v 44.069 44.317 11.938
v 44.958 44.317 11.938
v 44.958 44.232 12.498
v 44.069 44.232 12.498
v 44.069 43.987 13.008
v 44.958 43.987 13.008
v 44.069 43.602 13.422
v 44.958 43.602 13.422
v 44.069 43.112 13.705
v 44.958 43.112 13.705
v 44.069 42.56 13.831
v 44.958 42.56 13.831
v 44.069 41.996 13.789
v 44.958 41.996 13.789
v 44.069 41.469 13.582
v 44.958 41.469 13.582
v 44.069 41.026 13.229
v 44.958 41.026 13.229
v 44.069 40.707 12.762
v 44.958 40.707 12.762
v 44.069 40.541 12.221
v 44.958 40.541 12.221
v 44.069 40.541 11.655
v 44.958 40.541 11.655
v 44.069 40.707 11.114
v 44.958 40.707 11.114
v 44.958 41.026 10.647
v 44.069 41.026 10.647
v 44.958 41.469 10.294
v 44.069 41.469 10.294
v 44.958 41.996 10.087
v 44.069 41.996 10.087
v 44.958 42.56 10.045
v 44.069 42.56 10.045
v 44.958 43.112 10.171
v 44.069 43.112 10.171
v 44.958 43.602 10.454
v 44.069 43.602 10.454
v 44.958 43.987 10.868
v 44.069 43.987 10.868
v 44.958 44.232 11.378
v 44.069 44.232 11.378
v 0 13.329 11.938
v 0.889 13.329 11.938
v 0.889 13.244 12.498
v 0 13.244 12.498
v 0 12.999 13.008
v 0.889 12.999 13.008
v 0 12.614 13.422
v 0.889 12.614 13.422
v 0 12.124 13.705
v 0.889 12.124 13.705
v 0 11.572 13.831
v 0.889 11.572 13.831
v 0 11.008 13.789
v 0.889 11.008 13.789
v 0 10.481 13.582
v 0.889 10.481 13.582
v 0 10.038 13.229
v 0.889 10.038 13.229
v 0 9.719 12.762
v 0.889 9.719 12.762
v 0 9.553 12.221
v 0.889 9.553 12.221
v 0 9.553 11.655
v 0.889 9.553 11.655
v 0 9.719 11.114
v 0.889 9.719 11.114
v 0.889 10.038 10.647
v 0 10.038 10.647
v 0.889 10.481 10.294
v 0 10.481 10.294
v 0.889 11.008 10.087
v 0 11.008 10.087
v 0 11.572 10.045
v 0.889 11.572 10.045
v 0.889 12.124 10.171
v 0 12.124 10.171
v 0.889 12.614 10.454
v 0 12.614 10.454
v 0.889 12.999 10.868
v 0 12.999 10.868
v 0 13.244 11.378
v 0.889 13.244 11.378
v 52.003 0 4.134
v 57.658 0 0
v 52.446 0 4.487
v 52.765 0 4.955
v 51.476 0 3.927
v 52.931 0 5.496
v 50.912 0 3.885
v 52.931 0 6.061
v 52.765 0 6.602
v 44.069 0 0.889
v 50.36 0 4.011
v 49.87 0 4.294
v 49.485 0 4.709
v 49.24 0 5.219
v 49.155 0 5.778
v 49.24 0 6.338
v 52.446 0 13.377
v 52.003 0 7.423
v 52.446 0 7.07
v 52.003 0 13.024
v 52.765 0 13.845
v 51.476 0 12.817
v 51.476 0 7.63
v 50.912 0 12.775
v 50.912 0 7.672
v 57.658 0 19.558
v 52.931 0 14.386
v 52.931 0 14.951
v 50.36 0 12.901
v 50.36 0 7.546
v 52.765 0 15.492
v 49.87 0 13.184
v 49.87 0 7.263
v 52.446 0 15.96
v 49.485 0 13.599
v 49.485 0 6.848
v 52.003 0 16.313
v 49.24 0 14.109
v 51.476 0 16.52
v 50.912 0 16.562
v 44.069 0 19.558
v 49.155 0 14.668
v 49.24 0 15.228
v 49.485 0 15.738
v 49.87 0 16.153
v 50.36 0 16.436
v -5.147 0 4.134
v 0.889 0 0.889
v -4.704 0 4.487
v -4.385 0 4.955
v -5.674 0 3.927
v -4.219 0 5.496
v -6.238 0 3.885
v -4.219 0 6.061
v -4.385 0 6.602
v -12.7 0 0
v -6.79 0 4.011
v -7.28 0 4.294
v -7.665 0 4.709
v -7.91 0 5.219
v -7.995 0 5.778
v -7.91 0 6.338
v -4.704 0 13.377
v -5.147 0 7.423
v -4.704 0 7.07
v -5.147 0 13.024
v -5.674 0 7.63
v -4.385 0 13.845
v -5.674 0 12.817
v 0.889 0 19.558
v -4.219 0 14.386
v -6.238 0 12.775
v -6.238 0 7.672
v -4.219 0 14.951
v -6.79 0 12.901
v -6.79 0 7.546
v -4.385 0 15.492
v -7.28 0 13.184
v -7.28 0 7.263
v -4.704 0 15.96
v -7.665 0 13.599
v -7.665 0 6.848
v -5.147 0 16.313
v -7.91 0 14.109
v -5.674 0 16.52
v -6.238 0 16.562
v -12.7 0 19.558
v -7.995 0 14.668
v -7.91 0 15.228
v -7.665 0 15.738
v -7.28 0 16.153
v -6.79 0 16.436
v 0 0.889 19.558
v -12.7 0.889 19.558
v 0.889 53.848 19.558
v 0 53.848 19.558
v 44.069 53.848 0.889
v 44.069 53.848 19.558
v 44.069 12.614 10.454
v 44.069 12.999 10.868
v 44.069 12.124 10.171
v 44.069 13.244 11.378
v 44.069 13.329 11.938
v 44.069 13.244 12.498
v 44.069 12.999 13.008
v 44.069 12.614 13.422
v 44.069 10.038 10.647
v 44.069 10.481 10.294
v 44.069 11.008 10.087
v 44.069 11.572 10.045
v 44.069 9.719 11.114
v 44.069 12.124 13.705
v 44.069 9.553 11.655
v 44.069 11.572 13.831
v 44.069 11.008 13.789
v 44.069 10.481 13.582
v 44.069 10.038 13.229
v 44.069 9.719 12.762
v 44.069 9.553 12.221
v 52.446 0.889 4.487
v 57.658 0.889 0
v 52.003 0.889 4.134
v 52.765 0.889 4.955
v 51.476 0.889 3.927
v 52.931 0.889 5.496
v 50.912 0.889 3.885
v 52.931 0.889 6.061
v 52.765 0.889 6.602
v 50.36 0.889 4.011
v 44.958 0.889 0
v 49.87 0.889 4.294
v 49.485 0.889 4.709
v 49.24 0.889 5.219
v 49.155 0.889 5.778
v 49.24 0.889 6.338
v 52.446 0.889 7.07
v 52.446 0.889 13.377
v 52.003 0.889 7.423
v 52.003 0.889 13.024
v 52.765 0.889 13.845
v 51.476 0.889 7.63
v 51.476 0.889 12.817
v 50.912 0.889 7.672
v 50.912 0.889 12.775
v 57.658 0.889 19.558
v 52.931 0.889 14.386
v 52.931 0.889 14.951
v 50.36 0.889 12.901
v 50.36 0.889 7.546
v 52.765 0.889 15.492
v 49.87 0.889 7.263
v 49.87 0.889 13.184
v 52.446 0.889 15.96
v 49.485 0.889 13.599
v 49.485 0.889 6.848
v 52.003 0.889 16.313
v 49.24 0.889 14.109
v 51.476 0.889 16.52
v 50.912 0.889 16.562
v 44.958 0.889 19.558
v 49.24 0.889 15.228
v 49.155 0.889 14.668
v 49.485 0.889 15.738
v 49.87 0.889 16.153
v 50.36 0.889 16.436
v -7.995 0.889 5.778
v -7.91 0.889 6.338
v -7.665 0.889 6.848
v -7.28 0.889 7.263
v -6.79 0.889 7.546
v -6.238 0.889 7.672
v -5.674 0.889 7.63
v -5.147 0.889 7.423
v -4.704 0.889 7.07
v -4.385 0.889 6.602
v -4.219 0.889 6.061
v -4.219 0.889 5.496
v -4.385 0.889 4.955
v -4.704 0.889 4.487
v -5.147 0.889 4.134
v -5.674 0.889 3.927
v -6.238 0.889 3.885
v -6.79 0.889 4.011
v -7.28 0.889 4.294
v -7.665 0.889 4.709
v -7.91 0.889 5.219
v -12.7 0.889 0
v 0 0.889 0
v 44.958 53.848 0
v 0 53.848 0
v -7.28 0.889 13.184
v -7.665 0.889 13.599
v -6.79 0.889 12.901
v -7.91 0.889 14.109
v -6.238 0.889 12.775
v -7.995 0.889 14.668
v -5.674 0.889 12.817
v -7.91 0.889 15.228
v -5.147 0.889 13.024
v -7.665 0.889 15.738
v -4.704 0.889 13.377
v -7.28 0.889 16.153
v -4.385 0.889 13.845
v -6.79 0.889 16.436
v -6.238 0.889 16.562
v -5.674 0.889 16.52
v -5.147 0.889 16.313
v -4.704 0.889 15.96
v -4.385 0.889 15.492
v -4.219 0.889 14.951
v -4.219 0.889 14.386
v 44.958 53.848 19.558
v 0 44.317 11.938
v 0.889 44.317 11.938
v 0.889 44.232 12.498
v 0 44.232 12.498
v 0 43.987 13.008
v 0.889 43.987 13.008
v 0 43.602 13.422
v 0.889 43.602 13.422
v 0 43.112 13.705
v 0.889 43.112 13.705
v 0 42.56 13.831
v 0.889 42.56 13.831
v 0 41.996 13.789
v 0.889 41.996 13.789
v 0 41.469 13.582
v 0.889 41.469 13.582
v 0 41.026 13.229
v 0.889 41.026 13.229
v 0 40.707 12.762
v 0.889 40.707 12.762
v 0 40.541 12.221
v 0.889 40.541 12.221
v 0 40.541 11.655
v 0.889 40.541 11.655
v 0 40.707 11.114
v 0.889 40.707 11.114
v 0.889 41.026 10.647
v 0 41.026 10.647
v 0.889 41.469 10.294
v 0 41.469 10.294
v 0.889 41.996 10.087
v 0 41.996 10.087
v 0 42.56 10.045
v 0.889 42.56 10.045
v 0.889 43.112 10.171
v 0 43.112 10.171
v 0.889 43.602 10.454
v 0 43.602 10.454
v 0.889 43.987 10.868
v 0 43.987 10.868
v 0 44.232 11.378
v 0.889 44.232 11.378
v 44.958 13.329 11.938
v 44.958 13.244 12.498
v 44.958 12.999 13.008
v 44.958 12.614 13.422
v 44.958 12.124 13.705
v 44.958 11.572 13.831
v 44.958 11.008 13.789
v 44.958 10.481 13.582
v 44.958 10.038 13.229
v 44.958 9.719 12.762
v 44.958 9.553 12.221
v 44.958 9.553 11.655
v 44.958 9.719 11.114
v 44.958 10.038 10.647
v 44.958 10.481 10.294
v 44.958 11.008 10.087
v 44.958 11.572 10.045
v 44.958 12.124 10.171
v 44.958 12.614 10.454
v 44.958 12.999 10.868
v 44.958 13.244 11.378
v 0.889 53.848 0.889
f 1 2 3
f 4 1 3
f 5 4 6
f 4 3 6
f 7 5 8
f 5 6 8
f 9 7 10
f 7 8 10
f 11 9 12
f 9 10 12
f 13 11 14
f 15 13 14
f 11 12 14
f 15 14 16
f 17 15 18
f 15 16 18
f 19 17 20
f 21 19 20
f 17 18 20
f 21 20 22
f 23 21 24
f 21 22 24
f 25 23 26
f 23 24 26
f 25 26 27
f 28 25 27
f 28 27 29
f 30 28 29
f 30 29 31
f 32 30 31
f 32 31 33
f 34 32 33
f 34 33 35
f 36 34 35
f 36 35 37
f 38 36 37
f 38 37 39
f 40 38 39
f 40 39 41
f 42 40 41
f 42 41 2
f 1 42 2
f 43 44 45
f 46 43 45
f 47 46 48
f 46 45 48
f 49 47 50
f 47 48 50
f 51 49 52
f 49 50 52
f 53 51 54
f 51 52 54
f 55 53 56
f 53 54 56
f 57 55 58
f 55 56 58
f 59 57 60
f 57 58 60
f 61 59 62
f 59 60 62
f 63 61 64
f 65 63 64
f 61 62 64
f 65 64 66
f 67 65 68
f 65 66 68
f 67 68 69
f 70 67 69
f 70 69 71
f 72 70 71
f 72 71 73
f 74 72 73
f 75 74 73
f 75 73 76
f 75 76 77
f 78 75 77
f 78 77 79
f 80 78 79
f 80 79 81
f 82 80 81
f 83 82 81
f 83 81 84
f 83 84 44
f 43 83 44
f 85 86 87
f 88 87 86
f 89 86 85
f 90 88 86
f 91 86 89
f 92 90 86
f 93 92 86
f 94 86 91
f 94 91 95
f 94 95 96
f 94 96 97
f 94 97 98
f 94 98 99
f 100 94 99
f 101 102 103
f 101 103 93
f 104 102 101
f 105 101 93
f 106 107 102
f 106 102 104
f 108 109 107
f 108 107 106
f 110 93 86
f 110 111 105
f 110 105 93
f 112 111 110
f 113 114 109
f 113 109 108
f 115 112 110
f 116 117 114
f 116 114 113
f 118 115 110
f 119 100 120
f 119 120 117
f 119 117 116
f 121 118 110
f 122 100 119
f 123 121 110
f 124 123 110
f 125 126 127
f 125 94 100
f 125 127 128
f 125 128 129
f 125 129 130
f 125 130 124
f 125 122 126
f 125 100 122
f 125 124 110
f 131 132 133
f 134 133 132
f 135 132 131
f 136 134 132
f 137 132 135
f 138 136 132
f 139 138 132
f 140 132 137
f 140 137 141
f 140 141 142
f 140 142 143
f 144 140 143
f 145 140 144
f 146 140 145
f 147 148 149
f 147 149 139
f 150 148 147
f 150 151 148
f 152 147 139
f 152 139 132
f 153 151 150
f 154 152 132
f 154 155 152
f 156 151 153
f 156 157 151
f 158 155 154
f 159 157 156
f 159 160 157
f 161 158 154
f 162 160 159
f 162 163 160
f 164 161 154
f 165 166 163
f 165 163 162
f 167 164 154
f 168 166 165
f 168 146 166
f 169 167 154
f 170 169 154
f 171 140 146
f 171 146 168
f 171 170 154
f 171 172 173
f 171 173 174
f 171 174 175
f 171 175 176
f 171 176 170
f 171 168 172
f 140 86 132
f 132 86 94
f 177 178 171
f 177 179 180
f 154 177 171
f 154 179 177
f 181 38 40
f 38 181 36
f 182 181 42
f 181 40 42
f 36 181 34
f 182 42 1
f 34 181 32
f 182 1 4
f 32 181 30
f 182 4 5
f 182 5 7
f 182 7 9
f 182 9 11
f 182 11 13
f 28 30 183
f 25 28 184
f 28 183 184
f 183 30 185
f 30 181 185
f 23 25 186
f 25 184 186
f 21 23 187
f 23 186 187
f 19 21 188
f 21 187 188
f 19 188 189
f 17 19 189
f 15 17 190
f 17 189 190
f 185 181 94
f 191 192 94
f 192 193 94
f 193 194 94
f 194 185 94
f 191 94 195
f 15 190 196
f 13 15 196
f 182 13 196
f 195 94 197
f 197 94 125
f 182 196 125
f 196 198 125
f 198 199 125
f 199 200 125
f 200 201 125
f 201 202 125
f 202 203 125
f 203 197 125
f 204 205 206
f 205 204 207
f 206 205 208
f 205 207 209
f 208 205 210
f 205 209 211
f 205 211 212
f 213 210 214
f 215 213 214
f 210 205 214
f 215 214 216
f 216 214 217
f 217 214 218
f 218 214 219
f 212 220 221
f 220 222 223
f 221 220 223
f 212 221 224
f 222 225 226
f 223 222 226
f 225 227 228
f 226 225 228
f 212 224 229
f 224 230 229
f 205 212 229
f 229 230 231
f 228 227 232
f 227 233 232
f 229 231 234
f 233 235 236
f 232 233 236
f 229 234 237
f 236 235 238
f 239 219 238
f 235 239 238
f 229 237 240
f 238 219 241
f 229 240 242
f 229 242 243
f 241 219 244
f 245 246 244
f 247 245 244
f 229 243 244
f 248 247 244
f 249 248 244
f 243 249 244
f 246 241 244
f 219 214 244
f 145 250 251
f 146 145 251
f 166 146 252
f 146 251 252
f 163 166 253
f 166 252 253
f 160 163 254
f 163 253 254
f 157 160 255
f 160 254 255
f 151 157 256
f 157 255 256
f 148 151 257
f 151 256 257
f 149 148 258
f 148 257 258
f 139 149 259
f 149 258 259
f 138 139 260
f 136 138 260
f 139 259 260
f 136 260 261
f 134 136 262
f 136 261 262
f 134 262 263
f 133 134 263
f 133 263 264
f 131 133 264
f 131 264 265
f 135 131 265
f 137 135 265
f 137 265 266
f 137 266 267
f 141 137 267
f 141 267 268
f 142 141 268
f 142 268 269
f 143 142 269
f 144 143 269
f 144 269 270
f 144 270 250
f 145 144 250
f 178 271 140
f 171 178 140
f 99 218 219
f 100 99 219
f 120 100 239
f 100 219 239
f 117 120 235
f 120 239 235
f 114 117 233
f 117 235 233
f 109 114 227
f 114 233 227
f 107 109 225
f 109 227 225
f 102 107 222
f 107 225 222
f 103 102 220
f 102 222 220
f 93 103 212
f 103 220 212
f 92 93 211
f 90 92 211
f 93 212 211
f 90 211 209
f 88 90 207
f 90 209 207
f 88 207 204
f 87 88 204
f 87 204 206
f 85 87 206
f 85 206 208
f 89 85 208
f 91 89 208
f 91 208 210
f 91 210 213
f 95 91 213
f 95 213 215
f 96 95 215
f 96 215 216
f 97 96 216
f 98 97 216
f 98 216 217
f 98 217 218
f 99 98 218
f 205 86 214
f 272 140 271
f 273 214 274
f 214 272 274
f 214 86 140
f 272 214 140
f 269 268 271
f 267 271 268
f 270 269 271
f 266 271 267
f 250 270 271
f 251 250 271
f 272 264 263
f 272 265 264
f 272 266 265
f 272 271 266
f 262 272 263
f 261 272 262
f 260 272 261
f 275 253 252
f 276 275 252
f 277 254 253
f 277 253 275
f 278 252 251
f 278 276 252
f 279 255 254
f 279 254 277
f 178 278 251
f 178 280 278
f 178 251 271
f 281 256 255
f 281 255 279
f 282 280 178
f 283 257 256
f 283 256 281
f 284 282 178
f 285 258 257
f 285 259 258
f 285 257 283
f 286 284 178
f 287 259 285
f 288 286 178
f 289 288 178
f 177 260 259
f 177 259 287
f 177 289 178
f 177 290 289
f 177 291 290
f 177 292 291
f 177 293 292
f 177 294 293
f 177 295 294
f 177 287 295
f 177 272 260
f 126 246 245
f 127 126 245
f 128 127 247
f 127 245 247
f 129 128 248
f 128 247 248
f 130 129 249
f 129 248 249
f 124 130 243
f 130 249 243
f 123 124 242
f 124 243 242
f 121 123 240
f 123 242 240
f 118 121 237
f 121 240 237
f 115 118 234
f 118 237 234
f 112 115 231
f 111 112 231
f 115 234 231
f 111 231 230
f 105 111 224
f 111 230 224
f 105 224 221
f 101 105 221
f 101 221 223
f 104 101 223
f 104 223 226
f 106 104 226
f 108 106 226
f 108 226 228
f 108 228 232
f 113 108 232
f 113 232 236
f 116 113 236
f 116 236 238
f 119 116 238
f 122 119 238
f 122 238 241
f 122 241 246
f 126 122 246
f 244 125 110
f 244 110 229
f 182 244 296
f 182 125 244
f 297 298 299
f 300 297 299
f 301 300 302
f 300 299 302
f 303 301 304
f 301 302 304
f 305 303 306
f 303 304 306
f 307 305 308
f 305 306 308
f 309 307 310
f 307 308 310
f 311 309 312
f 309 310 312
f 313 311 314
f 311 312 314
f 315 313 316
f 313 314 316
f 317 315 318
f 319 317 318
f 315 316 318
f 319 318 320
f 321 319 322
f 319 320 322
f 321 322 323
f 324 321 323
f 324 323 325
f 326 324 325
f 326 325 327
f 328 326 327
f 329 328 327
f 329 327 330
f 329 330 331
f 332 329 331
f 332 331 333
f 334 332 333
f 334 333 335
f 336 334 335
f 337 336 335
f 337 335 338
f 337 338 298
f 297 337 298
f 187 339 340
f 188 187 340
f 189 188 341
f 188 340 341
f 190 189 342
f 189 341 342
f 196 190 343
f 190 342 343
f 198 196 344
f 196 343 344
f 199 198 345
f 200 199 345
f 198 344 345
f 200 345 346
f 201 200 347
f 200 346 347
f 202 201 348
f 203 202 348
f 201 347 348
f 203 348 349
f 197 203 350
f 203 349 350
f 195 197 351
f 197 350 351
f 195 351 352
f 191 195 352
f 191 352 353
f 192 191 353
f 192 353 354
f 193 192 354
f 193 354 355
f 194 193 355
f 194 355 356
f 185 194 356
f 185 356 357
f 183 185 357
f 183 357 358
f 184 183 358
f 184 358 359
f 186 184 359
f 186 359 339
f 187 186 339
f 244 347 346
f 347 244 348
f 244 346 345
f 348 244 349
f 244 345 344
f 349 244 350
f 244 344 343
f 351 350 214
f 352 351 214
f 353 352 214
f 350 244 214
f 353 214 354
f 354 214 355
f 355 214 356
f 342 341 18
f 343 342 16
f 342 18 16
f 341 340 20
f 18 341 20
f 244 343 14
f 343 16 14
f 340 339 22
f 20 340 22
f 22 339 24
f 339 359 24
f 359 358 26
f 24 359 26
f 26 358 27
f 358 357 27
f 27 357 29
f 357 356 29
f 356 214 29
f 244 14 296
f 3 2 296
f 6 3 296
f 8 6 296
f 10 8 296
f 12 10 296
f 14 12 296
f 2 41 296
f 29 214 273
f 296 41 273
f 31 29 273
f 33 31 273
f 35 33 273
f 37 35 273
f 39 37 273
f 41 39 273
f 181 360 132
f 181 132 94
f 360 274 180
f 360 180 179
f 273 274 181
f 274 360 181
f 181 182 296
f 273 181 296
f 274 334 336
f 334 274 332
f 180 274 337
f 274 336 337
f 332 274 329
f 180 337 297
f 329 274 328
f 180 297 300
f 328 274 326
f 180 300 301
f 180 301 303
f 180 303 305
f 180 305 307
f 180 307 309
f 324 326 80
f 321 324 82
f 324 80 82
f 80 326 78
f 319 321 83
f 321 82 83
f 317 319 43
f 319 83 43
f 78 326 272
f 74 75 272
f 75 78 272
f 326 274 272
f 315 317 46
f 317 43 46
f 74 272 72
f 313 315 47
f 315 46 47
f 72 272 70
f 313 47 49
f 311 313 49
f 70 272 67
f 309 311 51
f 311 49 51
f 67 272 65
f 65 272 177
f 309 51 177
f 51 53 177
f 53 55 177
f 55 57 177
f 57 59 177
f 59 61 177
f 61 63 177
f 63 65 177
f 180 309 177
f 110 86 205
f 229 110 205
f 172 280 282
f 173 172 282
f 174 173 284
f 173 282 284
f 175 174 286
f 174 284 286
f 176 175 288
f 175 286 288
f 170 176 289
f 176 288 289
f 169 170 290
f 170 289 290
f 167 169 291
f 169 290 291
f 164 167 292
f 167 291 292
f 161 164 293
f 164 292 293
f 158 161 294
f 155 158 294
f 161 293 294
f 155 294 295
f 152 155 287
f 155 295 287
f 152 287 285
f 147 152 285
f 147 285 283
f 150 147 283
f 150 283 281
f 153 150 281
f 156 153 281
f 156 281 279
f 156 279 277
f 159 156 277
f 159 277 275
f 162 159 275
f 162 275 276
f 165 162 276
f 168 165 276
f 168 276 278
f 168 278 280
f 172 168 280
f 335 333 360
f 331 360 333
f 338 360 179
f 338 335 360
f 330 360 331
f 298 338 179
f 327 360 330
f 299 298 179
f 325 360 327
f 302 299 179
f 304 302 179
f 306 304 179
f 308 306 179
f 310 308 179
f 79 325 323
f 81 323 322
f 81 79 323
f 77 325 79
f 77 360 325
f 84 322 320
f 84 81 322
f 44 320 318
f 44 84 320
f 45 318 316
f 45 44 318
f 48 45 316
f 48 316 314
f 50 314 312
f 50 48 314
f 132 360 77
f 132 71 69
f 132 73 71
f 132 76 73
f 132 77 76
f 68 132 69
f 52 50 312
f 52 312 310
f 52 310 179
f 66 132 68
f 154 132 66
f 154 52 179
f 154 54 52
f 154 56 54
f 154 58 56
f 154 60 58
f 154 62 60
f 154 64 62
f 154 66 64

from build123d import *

# Parameters (mm, degrees)
F0_W     = 44.958
F0_H     = 53.848
F1_DEPTH = 0.889
F2_W     = 0.889
F2_H     = 18.669
F3_DEPTH = 53.848
F4_W     = 0.889
F4_H     = 19.558
F5_DEPTH = 12.7
F6_W     = 0.889
F6_H     = 19.558
F7_DEPTH = 12.7
F9_D     = 3.7973
F11_D    = 3.7973


# Not quite as in the source:
# - a feature names something its author has since deleted; it is built from what else it names


with BuildPart() as f1:
    # F0 (on Top) → F1 (new body)
    with BuildSketch(Plane.XY):
        with Locations((22.479, 26.924)):
            Rectangle(F0_W, F0_H)
    extrude(amount=F1_DEPTH)

    # F2 (on face) → F3 (join, through all)
    with BuildSketch(Plane.XZ):
        with Locations((0.4445, 10.2235)):
            Rectangle(F2_W, F2_H)
        with Locations((44.5135, 10.2235)):
            Rectangle(F2_W, F2_H)
    extrude(amount=-F3_DEPTH)

    # F4 (on face) → F5 (join)
    with BuildSketch(Plane(origin=(0, 0, 0), x_dir=(0, -1, 0), z_dir=(-1, 0, 0))):
        with Locations((-0.4445, 9.779)):
            Rectangle(F4_W, F4_H)
    extrude(amount=F5_DEPTH)

    # F6 (on face) → F7 (join)
    with BuildSketch(Plane.YZ.offset(44.958)):
        with Locations((0.4445, 9.779)):
            Rectangle(F6_W, F6_H)
    extrude(amount=F7_DEPTH)

    # F9 (through all)
    with Locations(Plane.XZ):
        with Locations((-6.096, 14.6685), (-6.096, 5.7785), (51.054, 5.7785), (51.054, 14.6685)):
            Hole(F9_D / 2)

    # F11 (through all)
    with Locations(Plane(origin=(0, 0, 0), x_dir=(0, -1, 0), z_dir=(-1, 0, 0))):
        with Locations((-11.43, 11.938), (-42.418, 11.938)):
            Hole(F11_D / 2)


solid = f1.part
